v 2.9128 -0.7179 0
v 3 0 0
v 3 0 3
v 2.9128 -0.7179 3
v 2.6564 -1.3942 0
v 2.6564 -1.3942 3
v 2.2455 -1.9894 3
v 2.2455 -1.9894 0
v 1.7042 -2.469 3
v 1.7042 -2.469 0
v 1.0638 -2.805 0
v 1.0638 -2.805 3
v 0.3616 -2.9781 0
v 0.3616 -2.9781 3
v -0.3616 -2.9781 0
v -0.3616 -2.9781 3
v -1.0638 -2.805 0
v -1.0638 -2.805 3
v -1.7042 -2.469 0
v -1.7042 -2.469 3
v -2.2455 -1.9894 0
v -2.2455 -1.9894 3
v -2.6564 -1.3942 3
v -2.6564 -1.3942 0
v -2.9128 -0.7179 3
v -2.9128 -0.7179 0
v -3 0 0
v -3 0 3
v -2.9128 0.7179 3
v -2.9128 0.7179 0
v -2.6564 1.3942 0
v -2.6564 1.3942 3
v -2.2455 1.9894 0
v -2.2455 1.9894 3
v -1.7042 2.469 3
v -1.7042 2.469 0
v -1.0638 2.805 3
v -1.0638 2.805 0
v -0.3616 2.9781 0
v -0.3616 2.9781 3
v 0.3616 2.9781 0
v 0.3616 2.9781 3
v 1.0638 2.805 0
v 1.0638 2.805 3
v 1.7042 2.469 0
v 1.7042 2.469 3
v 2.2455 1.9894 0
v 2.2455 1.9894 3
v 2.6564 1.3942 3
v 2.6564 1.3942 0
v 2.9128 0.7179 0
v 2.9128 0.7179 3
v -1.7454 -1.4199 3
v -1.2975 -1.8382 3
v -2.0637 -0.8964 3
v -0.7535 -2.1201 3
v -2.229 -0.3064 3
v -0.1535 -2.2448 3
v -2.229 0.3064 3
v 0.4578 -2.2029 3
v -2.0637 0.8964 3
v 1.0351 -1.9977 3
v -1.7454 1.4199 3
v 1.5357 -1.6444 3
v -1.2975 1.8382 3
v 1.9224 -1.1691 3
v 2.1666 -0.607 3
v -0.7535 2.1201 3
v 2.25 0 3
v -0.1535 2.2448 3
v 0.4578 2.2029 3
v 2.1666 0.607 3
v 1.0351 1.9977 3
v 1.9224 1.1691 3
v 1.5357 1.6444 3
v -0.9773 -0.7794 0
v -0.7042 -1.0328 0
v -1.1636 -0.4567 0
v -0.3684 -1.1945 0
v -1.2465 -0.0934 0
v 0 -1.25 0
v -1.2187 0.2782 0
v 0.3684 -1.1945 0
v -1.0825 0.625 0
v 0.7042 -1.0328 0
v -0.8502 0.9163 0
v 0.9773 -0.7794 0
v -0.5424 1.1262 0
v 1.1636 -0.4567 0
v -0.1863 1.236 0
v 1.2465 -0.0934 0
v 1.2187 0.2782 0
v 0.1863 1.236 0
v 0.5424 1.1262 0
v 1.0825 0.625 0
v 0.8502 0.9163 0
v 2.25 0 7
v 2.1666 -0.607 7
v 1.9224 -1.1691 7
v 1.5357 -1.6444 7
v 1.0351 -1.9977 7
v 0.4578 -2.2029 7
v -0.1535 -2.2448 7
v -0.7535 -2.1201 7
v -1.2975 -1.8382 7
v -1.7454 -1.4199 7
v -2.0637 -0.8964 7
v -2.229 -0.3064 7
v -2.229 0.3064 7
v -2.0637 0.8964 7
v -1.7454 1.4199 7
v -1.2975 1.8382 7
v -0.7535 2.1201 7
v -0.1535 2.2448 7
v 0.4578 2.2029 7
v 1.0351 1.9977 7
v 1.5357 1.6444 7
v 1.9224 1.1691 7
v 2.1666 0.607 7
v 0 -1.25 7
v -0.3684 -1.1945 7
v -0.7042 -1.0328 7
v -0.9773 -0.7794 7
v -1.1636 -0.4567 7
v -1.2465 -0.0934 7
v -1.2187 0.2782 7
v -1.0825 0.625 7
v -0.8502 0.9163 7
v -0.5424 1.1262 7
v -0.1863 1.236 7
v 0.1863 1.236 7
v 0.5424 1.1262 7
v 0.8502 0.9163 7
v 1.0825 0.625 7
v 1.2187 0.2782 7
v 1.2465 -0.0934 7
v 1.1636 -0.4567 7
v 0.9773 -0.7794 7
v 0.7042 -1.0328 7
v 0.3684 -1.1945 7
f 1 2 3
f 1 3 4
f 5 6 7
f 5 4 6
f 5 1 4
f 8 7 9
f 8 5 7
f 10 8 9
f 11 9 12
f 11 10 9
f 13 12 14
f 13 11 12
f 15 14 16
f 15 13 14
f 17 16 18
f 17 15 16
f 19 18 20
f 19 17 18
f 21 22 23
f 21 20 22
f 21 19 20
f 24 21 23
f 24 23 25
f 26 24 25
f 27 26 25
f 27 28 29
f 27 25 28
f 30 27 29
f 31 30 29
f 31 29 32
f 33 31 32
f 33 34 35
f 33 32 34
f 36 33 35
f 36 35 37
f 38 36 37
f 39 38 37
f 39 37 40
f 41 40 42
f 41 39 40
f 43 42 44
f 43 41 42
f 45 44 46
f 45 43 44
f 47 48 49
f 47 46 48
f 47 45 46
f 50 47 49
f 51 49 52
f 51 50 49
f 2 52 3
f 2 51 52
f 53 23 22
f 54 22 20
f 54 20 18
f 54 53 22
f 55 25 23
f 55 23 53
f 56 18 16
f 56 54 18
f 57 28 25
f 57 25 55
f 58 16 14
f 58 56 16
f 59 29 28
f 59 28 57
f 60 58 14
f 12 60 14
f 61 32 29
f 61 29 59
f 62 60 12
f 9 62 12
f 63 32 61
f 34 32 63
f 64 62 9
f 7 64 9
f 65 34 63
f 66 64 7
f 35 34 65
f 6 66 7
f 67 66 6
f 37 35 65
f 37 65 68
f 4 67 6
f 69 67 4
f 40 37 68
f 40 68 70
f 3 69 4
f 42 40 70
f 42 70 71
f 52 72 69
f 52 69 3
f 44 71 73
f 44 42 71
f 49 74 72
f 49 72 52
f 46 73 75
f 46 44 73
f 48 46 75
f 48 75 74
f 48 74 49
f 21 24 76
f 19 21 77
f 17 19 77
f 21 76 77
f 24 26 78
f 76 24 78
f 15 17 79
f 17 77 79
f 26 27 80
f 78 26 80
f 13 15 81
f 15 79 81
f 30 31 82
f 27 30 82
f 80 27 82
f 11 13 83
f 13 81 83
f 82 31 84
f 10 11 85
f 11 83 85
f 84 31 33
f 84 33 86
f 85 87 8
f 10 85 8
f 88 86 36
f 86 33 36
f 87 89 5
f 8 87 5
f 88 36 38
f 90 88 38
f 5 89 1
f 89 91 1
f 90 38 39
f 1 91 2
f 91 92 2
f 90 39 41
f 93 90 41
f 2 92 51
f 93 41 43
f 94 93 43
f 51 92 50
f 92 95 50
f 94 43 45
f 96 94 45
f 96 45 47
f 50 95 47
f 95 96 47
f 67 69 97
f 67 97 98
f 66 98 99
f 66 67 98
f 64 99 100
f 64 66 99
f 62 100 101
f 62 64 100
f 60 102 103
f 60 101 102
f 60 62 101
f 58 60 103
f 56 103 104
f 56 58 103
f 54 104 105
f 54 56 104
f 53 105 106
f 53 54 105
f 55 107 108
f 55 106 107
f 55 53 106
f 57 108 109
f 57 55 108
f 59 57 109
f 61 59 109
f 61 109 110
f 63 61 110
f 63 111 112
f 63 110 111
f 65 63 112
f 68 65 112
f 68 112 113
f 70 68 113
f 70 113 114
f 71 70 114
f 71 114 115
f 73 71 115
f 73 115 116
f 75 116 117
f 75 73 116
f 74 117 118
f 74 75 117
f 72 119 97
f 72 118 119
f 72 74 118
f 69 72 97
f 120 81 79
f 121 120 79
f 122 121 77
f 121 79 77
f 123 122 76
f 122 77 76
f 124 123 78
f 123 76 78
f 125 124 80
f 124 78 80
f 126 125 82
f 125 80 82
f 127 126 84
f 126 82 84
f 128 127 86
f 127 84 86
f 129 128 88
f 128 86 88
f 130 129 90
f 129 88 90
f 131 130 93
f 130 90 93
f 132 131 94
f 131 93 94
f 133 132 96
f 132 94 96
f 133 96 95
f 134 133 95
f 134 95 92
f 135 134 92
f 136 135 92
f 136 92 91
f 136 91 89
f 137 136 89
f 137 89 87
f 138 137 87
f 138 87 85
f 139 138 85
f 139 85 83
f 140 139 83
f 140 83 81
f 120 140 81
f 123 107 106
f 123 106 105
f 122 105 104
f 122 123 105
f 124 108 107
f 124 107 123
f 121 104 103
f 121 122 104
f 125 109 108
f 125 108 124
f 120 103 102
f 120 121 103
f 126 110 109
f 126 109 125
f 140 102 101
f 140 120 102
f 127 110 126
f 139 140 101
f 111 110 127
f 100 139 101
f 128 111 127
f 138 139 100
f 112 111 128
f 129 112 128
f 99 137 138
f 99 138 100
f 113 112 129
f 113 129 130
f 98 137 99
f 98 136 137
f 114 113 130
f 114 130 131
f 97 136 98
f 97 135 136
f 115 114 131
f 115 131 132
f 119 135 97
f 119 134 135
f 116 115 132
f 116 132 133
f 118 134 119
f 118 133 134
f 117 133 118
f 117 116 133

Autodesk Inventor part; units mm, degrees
ref_plane "YZ Plane" through (0, 0, 0) normal (1, 0, 0) x (0, 1, 0)
ref_plane "XZ Plane" through (0, 0, 0) normal (0, 1, 0) x (-1, 0, 0)
ref_plane "XY Plane" through (0, 0, 0) normal (0, 0, 1) x (1, 0, 0)
sketch "スケッチ1" plane through (0, 0, 0) normal (0, 0, 1) x (1, 0, 0)
  circle A0 centre (0, 0) radius 3
  dimension "d20" = 6
extrude "押し出し1" add sketch "スケッチ1" along normal blind 3
sketch "スケッチ2" plane through (0, 0, 3) normal (0, 0, 1) x (1, 0, 0)
  circle A0 centre (0, 0) radius 2.25
  dimension "d3" = 4.5
extrude "押し出し2" add sketch "スケッチ2" along normal blind 4
sketch "スケッチ5" plane through (0, 0, 7) normal (0, 0, 1) x (1, 0, 0)
  point P0 (0, 0)
  point P1 (0, 0)
hole "穴2" at (0, 0, 7) direction (0, 0, -1) diameter 2.5 end through all
properties part number "RD009"
